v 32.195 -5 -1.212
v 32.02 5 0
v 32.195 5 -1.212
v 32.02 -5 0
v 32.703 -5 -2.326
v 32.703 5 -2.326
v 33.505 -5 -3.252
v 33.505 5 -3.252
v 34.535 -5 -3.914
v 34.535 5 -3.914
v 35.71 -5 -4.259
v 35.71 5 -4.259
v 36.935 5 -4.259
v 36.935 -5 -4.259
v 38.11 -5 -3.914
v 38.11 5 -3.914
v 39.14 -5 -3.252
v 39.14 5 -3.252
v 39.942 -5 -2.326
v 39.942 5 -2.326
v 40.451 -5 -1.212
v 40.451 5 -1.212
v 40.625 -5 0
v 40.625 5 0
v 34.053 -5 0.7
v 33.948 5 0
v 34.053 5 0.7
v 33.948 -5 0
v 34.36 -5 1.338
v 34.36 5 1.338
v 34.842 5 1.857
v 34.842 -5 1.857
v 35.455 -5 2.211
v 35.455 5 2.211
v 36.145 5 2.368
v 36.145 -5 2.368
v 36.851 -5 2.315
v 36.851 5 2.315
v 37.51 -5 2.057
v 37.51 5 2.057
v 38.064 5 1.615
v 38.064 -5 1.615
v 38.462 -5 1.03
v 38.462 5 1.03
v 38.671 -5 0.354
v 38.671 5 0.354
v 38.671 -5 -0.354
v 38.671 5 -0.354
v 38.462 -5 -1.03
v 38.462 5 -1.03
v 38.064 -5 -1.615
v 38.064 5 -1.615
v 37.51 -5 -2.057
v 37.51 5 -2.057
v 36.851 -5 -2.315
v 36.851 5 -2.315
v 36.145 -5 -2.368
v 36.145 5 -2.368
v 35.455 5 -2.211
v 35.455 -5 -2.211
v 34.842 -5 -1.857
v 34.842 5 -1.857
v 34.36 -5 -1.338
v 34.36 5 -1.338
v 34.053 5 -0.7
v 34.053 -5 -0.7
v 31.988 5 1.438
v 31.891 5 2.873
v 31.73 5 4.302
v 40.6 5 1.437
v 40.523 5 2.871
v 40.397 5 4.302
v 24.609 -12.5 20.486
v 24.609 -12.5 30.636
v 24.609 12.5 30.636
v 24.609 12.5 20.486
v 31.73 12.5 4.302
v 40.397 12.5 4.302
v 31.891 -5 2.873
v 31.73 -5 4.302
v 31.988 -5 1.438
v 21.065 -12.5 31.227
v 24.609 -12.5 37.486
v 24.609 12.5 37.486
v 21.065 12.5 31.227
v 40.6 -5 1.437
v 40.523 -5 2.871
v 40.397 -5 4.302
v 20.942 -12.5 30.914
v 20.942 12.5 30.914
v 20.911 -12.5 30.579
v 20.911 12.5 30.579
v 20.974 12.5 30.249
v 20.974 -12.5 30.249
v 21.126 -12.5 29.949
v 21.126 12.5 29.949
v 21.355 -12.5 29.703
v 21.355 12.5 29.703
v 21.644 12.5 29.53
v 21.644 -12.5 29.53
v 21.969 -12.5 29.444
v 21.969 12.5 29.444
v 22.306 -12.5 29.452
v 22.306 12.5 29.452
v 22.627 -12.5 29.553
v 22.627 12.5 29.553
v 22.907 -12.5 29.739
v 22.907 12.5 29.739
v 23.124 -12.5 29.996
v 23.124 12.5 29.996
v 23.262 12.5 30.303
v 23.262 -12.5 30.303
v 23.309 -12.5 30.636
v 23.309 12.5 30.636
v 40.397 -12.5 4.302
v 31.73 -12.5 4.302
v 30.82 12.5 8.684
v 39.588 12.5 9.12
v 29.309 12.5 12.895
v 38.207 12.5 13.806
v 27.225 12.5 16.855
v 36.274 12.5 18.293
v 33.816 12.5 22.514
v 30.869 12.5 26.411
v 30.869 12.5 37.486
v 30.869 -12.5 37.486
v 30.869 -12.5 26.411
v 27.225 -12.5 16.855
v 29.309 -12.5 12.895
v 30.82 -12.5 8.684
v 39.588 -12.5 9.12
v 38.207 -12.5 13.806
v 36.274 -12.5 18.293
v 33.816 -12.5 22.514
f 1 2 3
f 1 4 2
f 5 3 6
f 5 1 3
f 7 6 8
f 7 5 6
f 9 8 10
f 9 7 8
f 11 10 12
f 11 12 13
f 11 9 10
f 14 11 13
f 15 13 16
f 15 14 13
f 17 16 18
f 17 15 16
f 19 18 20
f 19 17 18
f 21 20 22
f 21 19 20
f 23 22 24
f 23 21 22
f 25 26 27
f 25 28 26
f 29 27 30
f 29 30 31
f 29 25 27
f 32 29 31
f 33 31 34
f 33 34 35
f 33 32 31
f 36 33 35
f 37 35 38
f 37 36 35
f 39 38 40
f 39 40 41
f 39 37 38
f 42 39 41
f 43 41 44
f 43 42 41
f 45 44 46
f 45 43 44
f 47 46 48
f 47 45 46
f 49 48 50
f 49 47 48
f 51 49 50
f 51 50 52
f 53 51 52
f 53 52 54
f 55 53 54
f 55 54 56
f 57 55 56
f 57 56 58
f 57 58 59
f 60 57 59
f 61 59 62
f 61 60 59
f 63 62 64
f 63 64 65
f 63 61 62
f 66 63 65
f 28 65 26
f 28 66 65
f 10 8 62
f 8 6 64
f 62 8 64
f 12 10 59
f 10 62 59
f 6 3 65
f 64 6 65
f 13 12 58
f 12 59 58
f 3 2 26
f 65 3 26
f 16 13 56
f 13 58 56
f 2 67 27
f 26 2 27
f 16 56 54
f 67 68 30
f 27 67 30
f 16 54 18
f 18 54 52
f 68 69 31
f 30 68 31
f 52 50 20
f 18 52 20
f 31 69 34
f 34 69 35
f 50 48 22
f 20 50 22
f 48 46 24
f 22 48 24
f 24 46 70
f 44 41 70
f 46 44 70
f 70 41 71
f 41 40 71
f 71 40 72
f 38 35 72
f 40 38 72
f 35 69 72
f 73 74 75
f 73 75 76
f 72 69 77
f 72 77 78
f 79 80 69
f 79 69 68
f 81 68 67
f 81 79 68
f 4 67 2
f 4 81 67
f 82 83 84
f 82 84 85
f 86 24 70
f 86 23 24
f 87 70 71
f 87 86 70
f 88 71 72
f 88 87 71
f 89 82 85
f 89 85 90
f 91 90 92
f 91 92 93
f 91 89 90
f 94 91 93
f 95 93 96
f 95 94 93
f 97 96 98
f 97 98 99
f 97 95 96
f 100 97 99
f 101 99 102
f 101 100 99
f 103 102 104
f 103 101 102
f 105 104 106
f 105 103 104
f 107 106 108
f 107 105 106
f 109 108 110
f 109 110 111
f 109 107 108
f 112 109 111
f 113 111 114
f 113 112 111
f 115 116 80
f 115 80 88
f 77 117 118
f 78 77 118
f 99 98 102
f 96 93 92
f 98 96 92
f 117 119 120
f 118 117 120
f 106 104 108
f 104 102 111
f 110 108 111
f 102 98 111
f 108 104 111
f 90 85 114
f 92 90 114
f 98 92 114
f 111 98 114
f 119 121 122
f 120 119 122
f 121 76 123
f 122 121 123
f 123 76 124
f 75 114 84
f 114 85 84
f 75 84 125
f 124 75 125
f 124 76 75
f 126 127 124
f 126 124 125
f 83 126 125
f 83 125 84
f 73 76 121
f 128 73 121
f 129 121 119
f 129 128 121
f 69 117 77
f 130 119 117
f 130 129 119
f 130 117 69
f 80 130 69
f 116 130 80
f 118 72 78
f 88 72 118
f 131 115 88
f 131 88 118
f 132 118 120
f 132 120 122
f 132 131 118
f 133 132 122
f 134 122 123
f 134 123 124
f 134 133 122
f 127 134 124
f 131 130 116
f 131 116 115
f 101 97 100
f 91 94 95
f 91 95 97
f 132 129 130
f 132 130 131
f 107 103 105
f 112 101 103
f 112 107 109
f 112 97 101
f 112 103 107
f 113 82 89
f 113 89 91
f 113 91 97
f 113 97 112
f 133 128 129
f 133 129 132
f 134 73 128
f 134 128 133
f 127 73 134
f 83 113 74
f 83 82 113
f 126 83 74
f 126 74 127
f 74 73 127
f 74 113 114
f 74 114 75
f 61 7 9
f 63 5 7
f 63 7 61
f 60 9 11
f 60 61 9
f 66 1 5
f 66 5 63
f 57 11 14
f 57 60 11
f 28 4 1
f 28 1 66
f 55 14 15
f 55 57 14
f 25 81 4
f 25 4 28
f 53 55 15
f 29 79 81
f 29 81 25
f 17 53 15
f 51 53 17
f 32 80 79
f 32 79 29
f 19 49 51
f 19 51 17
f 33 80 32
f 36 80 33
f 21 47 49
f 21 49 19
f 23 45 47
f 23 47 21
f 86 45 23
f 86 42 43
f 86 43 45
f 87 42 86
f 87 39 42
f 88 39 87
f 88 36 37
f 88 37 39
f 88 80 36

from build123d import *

# Parameters (mm, degrees)
F1_DEPTH = 5
F2_DEPTH = 12.5
F4_DEPTH = 25


with BuildPart() as f1:
    # F0 (on Front) → F1 (new body, symmetric)
    with BuildSketch(Plane.XZ):
        with BuildLine():
            ThreePointArc((40.396538, 4.302366), (35.393921, 19.941439), (24.609375, 32.322891))
            Line((24.609375, 32.322891), (24.609375, 20.486002))
            ThreePointArc((24.609375, 20.486002), (29.308809, 12.895398), (31.729911, 4.302366))
            Line((31.729911, 4.302366), (36.322634, 4.302366))
            Line((36.322634, 4.302366), (40.396538, 4.302366))
        make_face()
        with BuildLine():
            ThreePointArc((32.020269, 0), (36.322634, -4.302366), (40.625, 0))
            Line((40.625, 0), (38.697634, 0))
            ThreePointArc((38.697634, 0), (36.322634, -2.375), (33.947634, 0))
            Line((33.947634, 0), (32.020269, 0))
        make_face()
        with BuildLine():
            Line((38.697634, 0), (40.625, 0))
            ThreePointArc((40.625, 0), (39.364866, 3.042232), (36.322634, 4.302366))
            ThreePointArc((36.322634, 4.302366), (33.280402, 3.042232), (32.020269, 0))
            Line((32.020269, 0), (33.947634, 0))
            ThreePointArc((33.947634, 0), (36.322634, 2.375), (38.697634, 0))
        make_face()
        with BuildLine():
            ThreePointArc((32.020269, 0), (33.280402, 3.042232), (36.322634, 4.302366))
            Line((36.322634, 4.302366), (31.729911, 4.302366))
            ThreePointArc((31.729911, 4.302366), (31.947597, 2.156076), (32.020269, 0))
        make_face()
        with BuildLine():
            ThreePointArc((36.322634, 4.302366), (39.364866, 3.042232), (40.625, 0))
            ThreePointArc((40.625, 0), (40.567844, 2.154214), (40.396538, 4.302366))
            Line((40.396538, 4.302366), (36.322634, 4.302366))
        make_face()
    extrude(amount=F1_DEPTH, both=True)

    # F0 (on Front) → F2 (join, symmetric)
    with BuildSketch(Plane.XZ):
        with BuildLine():
            ThreePointArc((40.396538, 4.302366), (35.393921, 19.941439), (24.609375, 32.322891))
            Line((24.609375, 32.322891), (24.609375, 20.486002))
            ThreePointArc((24.609375, 20.486002), (29.308809, 12.895398), (31.729911, 4.302366))
            Line((31.729911, 4.302366), (36.322634, 4.302366))
            Line((36.322634, 4.302366), (40.396538, 4.302366))
        make_face()
    extrude(amount=F2_DEPTH, both=True)

    # F3 (on face) → F4 (join)
    with BuildSketch(Plane.XZ.offset(12.5)):
        Polygon((24.609375, 30.636002), (24.609375, 20.486002), (30.868572, 20.486002), (30.868572, 37.486002), (24.609375, 37.486002), align=None)
        with BuildLine():
            Line((23.309375, 30.636002), (24.609375, 30.636002))
            Line((24.609375, 30.636002), (24.609375, 37.486002))
            Line((24.609375, 37.486002), (21.065177, 31.227315))
            ThreePointArc((21.065177, 31.227315), (22.415122, 31.796397), (23.309375, 30.636002))
        make_face()
        with BuildLine():
            ThreePointArc((21.065177, 31.227315), (21.803628, 29.475606), (23.309375, 30.636002))
            ThreePointArc((23.309375, 30.636002), (22.415122, 31.796397), (21.065177, 31.227315))
        make_face()
    extrude(amount=-F4_DEPTH)


solid = f1.part
